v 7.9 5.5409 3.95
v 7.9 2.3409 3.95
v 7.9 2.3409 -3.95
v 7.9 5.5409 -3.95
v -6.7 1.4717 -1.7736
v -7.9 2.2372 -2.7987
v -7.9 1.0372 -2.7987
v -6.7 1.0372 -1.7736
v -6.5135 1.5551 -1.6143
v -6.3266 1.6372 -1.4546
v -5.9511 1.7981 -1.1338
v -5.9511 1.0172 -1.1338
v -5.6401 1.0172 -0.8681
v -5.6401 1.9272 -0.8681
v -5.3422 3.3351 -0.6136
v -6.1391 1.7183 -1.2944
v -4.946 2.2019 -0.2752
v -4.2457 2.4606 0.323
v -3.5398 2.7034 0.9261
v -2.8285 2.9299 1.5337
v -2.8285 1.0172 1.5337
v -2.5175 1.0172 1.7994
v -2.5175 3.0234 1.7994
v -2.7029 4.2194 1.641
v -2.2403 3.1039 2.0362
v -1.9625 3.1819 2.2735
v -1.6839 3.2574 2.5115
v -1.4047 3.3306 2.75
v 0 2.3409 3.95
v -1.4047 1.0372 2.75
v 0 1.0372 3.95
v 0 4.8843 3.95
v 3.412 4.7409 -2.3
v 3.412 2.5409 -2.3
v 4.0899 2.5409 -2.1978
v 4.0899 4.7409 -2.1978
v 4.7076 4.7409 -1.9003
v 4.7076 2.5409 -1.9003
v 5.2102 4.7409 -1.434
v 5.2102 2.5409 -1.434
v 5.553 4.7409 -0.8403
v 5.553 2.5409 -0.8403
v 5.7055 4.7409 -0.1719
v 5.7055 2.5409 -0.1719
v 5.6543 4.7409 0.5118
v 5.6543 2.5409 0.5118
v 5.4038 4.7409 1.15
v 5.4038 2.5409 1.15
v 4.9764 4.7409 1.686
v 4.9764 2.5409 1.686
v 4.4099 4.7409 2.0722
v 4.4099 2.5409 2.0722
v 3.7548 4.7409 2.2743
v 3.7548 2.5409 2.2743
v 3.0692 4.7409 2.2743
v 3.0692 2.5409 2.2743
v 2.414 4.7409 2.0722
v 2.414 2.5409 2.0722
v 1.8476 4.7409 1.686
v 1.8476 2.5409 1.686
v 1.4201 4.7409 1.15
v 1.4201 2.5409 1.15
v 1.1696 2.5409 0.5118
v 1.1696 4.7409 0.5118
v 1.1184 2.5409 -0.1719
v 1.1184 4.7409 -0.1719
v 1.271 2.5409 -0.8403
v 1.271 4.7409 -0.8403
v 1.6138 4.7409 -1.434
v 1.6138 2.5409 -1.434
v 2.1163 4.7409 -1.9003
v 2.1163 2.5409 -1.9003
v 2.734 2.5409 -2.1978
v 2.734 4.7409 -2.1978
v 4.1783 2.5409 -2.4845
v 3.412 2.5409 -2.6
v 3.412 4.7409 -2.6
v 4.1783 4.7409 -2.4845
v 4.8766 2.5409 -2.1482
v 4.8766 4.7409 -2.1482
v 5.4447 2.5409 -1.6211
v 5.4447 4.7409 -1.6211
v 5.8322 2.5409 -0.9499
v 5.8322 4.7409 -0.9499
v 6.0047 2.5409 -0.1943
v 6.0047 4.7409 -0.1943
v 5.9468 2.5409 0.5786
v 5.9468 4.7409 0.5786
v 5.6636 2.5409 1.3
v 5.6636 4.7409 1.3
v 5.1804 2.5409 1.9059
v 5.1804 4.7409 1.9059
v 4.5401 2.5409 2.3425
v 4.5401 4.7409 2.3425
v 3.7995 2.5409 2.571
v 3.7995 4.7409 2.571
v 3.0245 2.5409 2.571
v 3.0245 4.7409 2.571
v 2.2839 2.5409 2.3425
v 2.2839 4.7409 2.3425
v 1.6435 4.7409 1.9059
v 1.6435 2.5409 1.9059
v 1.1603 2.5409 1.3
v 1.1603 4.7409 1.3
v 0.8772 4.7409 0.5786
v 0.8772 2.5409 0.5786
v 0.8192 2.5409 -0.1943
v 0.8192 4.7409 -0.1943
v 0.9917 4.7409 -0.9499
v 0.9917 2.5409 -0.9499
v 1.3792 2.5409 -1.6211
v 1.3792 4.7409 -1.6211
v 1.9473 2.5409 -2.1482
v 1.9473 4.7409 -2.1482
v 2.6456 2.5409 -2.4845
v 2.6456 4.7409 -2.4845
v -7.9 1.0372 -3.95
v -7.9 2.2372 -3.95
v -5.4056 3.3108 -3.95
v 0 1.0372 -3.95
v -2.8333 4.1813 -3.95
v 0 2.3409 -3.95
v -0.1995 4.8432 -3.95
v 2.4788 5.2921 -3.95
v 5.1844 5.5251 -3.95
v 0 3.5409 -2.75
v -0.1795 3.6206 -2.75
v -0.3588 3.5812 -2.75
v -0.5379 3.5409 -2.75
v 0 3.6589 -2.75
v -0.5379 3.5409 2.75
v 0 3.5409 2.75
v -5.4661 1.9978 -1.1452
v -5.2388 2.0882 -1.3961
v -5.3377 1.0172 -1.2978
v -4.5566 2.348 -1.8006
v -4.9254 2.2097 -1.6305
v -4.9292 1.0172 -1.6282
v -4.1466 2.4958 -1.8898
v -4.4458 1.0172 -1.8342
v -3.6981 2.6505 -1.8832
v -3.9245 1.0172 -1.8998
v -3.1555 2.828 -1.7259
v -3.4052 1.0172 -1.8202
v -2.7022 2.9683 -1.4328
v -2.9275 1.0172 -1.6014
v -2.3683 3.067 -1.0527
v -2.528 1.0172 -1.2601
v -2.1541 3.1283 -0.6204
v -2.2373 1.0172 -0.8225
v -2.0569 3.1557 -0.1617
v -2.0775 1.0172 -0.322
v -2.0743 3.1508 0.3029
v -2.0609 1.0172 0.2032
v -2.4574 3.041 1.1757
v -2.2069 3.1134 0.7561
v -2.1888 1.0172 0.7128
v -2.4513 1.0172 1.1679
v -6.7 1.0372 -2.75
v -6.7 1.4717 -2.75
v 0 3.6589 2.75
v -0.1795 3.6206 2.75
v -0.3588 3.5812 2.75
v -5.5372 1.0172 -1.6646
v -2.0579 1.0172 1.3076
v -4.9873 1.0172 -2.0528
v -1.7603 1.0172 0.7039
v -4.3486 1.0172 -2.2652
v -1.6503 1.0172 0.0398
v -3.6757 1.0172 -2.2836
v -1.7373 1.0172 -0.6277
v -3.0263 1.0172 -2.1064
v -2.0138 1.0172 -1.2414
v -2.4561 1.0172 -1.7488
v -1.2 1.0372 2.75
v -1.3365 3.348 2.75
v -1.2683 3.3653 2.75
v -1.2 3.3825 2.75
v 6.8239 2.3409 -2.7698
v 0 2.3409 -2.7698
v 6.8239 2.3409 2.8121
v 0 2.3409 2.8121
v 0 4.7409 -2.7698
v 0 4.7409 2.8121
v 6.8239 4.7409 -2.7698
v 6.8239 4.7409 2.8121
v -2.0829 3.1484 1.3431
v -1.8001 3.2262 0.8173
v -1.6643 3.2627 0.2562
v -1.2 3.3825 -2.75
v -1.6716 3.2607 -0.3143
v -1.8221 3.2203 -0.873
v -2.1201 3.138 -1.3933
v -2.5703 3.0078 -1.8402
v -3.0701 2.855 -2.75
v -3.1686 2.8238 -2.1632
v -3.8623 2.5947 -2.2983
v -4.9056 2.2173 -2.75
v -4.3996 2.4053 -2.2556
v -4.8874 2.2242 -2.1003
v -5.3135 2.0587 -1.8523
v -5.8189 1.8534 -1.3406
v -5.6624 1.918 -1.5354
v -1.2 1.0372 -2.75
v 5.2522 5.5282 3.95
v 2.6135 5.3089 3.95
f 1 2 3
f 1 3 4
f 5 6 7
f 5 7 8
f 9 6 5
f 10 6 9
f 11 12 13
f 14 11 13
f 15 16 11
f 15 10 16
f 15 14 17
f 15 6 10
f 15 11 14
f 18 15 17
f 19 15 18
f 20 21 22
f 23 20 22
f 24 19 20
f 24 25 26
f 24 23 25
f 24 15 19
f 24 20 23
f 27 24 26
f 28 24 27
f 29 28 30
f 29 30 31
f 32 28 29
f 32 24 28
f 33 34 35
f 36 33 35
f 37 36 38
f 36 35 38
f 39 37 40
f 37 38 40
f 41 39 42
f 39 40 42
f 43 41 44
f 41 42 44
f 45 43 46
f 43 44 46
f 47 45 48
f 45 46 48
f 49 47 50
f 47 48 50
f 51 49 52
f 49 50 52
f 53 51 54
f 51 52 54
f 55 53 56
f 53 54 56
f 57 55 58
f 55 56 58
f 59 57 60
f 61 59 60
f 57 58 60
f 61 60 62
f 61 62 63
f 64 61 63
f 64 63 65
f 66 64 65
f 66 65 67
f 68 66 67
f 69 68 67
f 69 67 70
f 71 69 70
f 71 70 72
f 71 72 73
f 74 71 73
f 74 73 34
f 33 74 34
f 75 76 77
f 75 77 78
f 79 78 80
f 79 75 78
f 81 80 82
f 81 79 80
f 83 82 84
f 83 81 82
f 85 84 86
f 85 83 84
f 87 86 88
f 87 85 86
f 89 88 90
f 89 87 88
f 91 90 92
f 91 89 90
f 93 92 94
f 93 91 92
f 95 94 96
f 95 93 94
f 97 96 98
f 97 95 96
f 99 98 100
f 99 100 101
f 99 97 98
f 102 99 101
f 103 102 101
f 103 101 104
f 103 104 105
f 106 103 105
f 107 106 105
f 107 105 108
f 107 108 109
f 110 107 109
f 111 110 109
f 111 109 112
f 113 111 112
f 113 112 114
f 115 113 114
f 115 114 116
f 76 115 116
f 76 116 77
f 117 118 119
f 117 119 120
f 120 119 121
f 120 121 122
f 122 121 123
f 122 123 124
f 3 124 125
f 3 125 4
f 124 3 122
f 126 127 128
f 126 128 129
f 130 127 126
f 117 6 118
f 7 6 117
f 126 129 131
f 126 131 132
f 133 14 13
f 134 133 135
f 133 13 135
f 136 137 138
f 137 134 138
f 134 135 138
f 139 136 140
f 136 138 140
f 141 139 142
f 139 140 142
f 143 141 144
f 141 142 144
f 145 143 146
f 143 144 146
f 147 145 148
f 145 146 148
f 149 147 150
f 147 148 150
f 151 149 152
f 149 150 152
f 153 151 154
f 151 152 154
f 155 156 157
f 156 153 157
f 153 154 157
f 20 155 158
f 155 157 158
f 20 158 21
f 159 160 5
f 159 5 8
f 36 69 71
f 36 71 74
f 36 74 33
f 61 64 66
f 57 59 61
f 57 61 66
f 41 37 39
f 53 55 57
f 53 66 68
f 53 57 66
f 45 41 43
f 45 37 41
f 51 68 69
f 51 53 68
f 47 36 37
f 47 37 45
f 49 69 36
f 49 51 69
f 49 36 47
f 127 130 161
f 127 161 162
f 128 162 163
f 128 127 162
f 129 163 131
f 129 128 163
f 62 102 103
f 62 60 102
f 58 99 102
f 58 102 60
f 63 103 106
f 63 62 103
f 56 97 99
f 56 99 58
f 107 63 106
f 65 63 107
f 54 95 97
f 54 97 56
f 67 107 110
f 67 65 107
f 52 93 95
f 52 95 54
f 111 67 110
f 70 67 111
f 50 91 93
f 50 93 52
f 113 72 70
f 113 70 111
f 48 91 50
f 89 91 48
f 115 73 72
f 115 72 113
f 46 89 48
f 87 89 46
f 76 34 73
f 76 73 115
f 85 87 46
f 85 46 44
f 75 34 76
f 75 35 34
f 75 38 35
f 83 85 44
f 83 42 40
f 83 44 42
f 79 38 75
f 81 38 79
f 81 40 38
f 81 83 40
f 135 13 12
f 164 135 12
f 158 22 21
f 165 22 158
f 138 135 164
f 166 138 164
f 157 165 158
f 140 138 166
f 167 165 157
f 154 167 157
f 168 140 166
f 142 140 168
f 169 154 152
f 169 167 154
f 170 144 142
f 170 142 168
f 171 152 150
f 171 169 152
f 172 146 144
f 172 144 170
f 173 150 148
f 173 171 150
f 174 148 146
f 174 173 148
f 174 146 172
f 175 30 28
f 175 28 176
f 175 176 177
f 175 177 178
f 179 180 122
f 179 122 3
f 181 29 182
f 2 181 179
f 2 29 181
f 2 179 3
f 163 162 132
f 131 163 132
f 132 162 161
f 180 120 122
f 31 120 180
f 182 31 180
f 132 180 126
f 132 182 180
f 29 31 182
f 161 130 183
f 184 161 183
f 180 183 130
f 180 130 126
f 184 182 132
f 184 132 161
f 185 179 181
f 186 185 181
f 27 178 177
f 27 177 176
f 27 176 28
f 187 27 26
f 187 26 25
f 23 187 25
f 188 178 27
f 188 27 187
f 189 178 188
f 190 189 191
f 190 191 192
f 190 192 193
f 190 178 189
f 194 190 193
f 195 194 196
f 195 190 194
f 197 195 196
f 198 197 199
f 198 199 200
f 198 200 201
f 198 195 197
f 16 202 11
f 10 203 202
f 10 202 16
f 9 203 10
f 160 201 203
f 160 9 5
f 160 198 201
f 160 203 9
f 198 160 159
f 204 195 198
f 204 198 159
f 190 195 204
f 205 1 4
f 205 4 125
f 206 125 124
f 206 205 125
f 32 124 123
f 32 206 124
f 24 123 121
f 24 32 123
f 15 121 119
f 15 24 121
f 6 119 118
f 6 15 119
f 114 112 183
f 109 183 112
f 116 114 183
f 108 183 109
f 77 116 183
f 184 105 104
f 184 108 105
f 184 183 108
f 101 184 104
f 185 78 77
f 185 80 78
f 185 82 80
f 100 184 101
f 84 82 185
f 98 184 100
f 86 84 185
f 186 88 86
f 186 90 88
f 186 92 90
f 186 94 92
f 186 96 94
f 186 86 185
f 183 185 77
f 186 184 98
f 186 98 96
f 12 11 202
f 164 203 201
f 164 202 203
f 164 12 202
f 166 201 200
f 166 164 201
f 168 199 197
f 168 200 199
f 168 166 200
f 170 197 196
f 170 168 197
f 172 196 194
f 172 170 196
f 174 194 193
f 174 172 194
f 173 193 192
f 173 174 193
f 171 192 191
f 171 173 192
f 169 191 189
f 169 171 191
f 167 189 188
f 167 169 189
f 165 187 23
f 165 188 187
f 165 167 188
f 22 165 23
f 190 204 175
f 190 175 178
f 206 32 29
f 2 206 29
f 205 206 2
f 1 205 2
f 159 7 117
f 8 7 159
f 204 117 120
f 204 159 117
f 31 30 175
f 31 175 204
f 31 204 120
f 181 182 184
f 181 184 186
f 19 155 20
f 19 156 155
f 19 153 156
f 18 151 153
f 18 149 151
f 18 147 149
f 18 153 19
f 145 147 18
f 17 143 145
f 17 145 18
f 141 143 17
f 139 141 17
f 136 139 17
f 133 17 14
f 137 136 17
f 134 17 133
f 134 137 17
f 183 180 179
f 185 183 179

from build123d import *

# Parameters (mm, degrees)
BOSS_EXTRUDE1_DEPTH      = 3.95
SHELL1_START             = -2.75
SHELL1_DEPTH             = 5.5
BOSS_EXTRUDE2_REACH      = 11.943
BOSS_EXTRUDE2_END_RADIUS = 32.700000868
BOSS_EXTRUDE2_START      = 0.02
SKETCH2_R                = 2.3
SKETCH2_R_2              = 1.9
SKETCH3_W                = 6.823927471
SKETCH3_H                = 5.581929969
CUT_EXTRUDE1_DEPTH       = 2.4
BOSS_EXTRUDE3_REACH      = 11.601
BOSS_EXTRUDE3_START      = -0.2
SKETCH4_R                = 2.6
SKETCH4_R_2              = 2.3
CUT_EXTRUDE6_DEPTH       = 10.923471076
CUT_EXTRUDE6_DEPTH_BACK  = 10.923471076


with BuildPart() as part:
    # Sketch1 → Boss-Extrude1 (new, symmetric)
    with BuildSketch(Plane.XY):
        with BuildLine():
            Line((-7.9, 1.037208095), (0, 1.037208095))
            Line((0, 1.037208095), (0, 2.340892579))
            Line((0, 2.340892579), (7.9, 2.340892579))
            Line((7.9, 2.340892579), (7.9, 5.540892579))
            ThreePointArc((7.9, 5.540892579), (-0.199501968, 4.843176285), (-7.9, 2.237208095))
            Line((-7.9, 2.237208095), (-7.9, 1.037208095))
        make_face()
    extrude(amount=BOSS_EXTRUDE1_DEPTH, both=True)

    # Shell1: read off the stored shape, not the designer's step
    # Shell1 outline → Shell1 (cut)
    with BuildSketch(Plane.XY.offset(SHELL1_START)):
        with BuildLine():
            Line((-1.2, 1.037208095), (-1.2, 3.382492095))
            ThreePointArc((-1.2, 3.382492095), (-3.992613389, 2.549753458), (-6.7, 1.471699231))
            Line((-6.7, 1.471699231), (-6.7, 1.037208095))
            Line((-6.7, 1.037208095), (-1.2, 1.037208095))
        make_face()
        with BuildLine():
            ThreePointArc((6.7, 4.360765395), (3.058165542, 4.152993699), (-0.537868318, 3.540892579))
            Line((-0.537868318, 3.540892579), (6.7, 3.540892579))
            Line((6.7, 3.540892579), (6.7, 4.360765395))
        make_face()
    extrude(amount=SHELL1_DEPTH, mode=Mode.SUBTRACT)

    # Boss-Extrude2: up to this cylinder (the profile starts inside it)
    boss_extrude2_end = Plane(origin=(6.738734935, -28.339212532, 2.234946), z_dir=(0, 0, -1)) * Cylinder(BOSS_EXTRUDE2_END_RADIUS, 90.286001737, mode=Mode.PRIVATE)
    # Sketch2 → Boss-Extrude2 (add, up to the surface)
    with BuildSketch(Plane(origin=(0, 1.037208095, 0), x_dir=(-1, 0, 0), z_dir=(0, -1, 0)).offset(BOSS_EXTRUDE2_START), mode=Mode.PRIVATE) as boss_extrude2_sk1:
        with Locations(Location((3.95, 0, 0), (0, 0, 90))):
            Circle(SKETCH2_R)
        with Locations(Location((3.95, 0, 0), (0, 0, 90))):
            Circle(SKETCH2_R_2, mode=Mode.SUBTRACT)
    boss_extrude2_tool1 = extrude(boss_extrude2_sk1.sketch, amount=-BOSS_EXTRUDE2_REACH, mode=Mode.PRIVATE) & boss_extrude2_end
    add(boss_extrude2_tool1.solids().sort_by_distance((-3.95, 1.017208, 2.234946))[0])

    # Sketch3 → Cut-Extrude1 (cut)
    with BuildSketch(Plane.XZ.offset(-2.340892579)):
        with Locations((3.411963736, 0.021143674)):
            Rectangle(SKETCH3_W, SKETCH3_H)
    extrude(amount=-CUT_EXTRUDE1_DEPTH, mode=Mode.SUBTRACT)

    # Sketch4 → Boss-Extrude3 (add, up to next)
    with BuildSketch(Plane(origin=(0, 2.340892579, 0), x_dir=(-1, 0, 0), z_dir=(0, -1, 0)).offset(BOSS_EXTRUDE3_START), mode=Mode.PRIVATE) as boss_extrude3_sk1:
        with Locations(Location((-3.411963735, 0, 0), (0, 0, 90))):
            Circle(SKETCH4_R)
        with Locations(Location((-3.411963735, 0, 0), (0, 0, 90))):
            Circle(SKETCH4_R_2, mode=Mode.SUBTRACT)
    boss_extrude3_tool1 = extrude(boss_extrude3_sk1.sketch, amount=-BOSS_EXTRUDE3_REACH, mode=Mode.PRIVATE) - part.part
    add(boss_extrude3_tool1.solids().sort_by_distance((3.411964, 2.540893, 2.526461))[0])

    # Sketch10 → Cut-Extrude6 (cut, two sides: drawn at the far end of the back side and taken through both)
    with BuildSketch(Plane(origin=(0, 1.037208095, 0), x_dir=(-1, 0, 0), z_dir=(0, -1, 0)).offset(-CUT_EXTRUDE6_DEPTH_BACK)):
        Polygon((7.9, 2.798684465), (0, -3.95), (7.9, -3.95), align=None)
    extrude(amount=CUT_EXTRUDE6_DEPTH + CUT_EXTRUDE6_DEPTH_BACK, mode=Mode.SUBTRACT)


solid = part.part
